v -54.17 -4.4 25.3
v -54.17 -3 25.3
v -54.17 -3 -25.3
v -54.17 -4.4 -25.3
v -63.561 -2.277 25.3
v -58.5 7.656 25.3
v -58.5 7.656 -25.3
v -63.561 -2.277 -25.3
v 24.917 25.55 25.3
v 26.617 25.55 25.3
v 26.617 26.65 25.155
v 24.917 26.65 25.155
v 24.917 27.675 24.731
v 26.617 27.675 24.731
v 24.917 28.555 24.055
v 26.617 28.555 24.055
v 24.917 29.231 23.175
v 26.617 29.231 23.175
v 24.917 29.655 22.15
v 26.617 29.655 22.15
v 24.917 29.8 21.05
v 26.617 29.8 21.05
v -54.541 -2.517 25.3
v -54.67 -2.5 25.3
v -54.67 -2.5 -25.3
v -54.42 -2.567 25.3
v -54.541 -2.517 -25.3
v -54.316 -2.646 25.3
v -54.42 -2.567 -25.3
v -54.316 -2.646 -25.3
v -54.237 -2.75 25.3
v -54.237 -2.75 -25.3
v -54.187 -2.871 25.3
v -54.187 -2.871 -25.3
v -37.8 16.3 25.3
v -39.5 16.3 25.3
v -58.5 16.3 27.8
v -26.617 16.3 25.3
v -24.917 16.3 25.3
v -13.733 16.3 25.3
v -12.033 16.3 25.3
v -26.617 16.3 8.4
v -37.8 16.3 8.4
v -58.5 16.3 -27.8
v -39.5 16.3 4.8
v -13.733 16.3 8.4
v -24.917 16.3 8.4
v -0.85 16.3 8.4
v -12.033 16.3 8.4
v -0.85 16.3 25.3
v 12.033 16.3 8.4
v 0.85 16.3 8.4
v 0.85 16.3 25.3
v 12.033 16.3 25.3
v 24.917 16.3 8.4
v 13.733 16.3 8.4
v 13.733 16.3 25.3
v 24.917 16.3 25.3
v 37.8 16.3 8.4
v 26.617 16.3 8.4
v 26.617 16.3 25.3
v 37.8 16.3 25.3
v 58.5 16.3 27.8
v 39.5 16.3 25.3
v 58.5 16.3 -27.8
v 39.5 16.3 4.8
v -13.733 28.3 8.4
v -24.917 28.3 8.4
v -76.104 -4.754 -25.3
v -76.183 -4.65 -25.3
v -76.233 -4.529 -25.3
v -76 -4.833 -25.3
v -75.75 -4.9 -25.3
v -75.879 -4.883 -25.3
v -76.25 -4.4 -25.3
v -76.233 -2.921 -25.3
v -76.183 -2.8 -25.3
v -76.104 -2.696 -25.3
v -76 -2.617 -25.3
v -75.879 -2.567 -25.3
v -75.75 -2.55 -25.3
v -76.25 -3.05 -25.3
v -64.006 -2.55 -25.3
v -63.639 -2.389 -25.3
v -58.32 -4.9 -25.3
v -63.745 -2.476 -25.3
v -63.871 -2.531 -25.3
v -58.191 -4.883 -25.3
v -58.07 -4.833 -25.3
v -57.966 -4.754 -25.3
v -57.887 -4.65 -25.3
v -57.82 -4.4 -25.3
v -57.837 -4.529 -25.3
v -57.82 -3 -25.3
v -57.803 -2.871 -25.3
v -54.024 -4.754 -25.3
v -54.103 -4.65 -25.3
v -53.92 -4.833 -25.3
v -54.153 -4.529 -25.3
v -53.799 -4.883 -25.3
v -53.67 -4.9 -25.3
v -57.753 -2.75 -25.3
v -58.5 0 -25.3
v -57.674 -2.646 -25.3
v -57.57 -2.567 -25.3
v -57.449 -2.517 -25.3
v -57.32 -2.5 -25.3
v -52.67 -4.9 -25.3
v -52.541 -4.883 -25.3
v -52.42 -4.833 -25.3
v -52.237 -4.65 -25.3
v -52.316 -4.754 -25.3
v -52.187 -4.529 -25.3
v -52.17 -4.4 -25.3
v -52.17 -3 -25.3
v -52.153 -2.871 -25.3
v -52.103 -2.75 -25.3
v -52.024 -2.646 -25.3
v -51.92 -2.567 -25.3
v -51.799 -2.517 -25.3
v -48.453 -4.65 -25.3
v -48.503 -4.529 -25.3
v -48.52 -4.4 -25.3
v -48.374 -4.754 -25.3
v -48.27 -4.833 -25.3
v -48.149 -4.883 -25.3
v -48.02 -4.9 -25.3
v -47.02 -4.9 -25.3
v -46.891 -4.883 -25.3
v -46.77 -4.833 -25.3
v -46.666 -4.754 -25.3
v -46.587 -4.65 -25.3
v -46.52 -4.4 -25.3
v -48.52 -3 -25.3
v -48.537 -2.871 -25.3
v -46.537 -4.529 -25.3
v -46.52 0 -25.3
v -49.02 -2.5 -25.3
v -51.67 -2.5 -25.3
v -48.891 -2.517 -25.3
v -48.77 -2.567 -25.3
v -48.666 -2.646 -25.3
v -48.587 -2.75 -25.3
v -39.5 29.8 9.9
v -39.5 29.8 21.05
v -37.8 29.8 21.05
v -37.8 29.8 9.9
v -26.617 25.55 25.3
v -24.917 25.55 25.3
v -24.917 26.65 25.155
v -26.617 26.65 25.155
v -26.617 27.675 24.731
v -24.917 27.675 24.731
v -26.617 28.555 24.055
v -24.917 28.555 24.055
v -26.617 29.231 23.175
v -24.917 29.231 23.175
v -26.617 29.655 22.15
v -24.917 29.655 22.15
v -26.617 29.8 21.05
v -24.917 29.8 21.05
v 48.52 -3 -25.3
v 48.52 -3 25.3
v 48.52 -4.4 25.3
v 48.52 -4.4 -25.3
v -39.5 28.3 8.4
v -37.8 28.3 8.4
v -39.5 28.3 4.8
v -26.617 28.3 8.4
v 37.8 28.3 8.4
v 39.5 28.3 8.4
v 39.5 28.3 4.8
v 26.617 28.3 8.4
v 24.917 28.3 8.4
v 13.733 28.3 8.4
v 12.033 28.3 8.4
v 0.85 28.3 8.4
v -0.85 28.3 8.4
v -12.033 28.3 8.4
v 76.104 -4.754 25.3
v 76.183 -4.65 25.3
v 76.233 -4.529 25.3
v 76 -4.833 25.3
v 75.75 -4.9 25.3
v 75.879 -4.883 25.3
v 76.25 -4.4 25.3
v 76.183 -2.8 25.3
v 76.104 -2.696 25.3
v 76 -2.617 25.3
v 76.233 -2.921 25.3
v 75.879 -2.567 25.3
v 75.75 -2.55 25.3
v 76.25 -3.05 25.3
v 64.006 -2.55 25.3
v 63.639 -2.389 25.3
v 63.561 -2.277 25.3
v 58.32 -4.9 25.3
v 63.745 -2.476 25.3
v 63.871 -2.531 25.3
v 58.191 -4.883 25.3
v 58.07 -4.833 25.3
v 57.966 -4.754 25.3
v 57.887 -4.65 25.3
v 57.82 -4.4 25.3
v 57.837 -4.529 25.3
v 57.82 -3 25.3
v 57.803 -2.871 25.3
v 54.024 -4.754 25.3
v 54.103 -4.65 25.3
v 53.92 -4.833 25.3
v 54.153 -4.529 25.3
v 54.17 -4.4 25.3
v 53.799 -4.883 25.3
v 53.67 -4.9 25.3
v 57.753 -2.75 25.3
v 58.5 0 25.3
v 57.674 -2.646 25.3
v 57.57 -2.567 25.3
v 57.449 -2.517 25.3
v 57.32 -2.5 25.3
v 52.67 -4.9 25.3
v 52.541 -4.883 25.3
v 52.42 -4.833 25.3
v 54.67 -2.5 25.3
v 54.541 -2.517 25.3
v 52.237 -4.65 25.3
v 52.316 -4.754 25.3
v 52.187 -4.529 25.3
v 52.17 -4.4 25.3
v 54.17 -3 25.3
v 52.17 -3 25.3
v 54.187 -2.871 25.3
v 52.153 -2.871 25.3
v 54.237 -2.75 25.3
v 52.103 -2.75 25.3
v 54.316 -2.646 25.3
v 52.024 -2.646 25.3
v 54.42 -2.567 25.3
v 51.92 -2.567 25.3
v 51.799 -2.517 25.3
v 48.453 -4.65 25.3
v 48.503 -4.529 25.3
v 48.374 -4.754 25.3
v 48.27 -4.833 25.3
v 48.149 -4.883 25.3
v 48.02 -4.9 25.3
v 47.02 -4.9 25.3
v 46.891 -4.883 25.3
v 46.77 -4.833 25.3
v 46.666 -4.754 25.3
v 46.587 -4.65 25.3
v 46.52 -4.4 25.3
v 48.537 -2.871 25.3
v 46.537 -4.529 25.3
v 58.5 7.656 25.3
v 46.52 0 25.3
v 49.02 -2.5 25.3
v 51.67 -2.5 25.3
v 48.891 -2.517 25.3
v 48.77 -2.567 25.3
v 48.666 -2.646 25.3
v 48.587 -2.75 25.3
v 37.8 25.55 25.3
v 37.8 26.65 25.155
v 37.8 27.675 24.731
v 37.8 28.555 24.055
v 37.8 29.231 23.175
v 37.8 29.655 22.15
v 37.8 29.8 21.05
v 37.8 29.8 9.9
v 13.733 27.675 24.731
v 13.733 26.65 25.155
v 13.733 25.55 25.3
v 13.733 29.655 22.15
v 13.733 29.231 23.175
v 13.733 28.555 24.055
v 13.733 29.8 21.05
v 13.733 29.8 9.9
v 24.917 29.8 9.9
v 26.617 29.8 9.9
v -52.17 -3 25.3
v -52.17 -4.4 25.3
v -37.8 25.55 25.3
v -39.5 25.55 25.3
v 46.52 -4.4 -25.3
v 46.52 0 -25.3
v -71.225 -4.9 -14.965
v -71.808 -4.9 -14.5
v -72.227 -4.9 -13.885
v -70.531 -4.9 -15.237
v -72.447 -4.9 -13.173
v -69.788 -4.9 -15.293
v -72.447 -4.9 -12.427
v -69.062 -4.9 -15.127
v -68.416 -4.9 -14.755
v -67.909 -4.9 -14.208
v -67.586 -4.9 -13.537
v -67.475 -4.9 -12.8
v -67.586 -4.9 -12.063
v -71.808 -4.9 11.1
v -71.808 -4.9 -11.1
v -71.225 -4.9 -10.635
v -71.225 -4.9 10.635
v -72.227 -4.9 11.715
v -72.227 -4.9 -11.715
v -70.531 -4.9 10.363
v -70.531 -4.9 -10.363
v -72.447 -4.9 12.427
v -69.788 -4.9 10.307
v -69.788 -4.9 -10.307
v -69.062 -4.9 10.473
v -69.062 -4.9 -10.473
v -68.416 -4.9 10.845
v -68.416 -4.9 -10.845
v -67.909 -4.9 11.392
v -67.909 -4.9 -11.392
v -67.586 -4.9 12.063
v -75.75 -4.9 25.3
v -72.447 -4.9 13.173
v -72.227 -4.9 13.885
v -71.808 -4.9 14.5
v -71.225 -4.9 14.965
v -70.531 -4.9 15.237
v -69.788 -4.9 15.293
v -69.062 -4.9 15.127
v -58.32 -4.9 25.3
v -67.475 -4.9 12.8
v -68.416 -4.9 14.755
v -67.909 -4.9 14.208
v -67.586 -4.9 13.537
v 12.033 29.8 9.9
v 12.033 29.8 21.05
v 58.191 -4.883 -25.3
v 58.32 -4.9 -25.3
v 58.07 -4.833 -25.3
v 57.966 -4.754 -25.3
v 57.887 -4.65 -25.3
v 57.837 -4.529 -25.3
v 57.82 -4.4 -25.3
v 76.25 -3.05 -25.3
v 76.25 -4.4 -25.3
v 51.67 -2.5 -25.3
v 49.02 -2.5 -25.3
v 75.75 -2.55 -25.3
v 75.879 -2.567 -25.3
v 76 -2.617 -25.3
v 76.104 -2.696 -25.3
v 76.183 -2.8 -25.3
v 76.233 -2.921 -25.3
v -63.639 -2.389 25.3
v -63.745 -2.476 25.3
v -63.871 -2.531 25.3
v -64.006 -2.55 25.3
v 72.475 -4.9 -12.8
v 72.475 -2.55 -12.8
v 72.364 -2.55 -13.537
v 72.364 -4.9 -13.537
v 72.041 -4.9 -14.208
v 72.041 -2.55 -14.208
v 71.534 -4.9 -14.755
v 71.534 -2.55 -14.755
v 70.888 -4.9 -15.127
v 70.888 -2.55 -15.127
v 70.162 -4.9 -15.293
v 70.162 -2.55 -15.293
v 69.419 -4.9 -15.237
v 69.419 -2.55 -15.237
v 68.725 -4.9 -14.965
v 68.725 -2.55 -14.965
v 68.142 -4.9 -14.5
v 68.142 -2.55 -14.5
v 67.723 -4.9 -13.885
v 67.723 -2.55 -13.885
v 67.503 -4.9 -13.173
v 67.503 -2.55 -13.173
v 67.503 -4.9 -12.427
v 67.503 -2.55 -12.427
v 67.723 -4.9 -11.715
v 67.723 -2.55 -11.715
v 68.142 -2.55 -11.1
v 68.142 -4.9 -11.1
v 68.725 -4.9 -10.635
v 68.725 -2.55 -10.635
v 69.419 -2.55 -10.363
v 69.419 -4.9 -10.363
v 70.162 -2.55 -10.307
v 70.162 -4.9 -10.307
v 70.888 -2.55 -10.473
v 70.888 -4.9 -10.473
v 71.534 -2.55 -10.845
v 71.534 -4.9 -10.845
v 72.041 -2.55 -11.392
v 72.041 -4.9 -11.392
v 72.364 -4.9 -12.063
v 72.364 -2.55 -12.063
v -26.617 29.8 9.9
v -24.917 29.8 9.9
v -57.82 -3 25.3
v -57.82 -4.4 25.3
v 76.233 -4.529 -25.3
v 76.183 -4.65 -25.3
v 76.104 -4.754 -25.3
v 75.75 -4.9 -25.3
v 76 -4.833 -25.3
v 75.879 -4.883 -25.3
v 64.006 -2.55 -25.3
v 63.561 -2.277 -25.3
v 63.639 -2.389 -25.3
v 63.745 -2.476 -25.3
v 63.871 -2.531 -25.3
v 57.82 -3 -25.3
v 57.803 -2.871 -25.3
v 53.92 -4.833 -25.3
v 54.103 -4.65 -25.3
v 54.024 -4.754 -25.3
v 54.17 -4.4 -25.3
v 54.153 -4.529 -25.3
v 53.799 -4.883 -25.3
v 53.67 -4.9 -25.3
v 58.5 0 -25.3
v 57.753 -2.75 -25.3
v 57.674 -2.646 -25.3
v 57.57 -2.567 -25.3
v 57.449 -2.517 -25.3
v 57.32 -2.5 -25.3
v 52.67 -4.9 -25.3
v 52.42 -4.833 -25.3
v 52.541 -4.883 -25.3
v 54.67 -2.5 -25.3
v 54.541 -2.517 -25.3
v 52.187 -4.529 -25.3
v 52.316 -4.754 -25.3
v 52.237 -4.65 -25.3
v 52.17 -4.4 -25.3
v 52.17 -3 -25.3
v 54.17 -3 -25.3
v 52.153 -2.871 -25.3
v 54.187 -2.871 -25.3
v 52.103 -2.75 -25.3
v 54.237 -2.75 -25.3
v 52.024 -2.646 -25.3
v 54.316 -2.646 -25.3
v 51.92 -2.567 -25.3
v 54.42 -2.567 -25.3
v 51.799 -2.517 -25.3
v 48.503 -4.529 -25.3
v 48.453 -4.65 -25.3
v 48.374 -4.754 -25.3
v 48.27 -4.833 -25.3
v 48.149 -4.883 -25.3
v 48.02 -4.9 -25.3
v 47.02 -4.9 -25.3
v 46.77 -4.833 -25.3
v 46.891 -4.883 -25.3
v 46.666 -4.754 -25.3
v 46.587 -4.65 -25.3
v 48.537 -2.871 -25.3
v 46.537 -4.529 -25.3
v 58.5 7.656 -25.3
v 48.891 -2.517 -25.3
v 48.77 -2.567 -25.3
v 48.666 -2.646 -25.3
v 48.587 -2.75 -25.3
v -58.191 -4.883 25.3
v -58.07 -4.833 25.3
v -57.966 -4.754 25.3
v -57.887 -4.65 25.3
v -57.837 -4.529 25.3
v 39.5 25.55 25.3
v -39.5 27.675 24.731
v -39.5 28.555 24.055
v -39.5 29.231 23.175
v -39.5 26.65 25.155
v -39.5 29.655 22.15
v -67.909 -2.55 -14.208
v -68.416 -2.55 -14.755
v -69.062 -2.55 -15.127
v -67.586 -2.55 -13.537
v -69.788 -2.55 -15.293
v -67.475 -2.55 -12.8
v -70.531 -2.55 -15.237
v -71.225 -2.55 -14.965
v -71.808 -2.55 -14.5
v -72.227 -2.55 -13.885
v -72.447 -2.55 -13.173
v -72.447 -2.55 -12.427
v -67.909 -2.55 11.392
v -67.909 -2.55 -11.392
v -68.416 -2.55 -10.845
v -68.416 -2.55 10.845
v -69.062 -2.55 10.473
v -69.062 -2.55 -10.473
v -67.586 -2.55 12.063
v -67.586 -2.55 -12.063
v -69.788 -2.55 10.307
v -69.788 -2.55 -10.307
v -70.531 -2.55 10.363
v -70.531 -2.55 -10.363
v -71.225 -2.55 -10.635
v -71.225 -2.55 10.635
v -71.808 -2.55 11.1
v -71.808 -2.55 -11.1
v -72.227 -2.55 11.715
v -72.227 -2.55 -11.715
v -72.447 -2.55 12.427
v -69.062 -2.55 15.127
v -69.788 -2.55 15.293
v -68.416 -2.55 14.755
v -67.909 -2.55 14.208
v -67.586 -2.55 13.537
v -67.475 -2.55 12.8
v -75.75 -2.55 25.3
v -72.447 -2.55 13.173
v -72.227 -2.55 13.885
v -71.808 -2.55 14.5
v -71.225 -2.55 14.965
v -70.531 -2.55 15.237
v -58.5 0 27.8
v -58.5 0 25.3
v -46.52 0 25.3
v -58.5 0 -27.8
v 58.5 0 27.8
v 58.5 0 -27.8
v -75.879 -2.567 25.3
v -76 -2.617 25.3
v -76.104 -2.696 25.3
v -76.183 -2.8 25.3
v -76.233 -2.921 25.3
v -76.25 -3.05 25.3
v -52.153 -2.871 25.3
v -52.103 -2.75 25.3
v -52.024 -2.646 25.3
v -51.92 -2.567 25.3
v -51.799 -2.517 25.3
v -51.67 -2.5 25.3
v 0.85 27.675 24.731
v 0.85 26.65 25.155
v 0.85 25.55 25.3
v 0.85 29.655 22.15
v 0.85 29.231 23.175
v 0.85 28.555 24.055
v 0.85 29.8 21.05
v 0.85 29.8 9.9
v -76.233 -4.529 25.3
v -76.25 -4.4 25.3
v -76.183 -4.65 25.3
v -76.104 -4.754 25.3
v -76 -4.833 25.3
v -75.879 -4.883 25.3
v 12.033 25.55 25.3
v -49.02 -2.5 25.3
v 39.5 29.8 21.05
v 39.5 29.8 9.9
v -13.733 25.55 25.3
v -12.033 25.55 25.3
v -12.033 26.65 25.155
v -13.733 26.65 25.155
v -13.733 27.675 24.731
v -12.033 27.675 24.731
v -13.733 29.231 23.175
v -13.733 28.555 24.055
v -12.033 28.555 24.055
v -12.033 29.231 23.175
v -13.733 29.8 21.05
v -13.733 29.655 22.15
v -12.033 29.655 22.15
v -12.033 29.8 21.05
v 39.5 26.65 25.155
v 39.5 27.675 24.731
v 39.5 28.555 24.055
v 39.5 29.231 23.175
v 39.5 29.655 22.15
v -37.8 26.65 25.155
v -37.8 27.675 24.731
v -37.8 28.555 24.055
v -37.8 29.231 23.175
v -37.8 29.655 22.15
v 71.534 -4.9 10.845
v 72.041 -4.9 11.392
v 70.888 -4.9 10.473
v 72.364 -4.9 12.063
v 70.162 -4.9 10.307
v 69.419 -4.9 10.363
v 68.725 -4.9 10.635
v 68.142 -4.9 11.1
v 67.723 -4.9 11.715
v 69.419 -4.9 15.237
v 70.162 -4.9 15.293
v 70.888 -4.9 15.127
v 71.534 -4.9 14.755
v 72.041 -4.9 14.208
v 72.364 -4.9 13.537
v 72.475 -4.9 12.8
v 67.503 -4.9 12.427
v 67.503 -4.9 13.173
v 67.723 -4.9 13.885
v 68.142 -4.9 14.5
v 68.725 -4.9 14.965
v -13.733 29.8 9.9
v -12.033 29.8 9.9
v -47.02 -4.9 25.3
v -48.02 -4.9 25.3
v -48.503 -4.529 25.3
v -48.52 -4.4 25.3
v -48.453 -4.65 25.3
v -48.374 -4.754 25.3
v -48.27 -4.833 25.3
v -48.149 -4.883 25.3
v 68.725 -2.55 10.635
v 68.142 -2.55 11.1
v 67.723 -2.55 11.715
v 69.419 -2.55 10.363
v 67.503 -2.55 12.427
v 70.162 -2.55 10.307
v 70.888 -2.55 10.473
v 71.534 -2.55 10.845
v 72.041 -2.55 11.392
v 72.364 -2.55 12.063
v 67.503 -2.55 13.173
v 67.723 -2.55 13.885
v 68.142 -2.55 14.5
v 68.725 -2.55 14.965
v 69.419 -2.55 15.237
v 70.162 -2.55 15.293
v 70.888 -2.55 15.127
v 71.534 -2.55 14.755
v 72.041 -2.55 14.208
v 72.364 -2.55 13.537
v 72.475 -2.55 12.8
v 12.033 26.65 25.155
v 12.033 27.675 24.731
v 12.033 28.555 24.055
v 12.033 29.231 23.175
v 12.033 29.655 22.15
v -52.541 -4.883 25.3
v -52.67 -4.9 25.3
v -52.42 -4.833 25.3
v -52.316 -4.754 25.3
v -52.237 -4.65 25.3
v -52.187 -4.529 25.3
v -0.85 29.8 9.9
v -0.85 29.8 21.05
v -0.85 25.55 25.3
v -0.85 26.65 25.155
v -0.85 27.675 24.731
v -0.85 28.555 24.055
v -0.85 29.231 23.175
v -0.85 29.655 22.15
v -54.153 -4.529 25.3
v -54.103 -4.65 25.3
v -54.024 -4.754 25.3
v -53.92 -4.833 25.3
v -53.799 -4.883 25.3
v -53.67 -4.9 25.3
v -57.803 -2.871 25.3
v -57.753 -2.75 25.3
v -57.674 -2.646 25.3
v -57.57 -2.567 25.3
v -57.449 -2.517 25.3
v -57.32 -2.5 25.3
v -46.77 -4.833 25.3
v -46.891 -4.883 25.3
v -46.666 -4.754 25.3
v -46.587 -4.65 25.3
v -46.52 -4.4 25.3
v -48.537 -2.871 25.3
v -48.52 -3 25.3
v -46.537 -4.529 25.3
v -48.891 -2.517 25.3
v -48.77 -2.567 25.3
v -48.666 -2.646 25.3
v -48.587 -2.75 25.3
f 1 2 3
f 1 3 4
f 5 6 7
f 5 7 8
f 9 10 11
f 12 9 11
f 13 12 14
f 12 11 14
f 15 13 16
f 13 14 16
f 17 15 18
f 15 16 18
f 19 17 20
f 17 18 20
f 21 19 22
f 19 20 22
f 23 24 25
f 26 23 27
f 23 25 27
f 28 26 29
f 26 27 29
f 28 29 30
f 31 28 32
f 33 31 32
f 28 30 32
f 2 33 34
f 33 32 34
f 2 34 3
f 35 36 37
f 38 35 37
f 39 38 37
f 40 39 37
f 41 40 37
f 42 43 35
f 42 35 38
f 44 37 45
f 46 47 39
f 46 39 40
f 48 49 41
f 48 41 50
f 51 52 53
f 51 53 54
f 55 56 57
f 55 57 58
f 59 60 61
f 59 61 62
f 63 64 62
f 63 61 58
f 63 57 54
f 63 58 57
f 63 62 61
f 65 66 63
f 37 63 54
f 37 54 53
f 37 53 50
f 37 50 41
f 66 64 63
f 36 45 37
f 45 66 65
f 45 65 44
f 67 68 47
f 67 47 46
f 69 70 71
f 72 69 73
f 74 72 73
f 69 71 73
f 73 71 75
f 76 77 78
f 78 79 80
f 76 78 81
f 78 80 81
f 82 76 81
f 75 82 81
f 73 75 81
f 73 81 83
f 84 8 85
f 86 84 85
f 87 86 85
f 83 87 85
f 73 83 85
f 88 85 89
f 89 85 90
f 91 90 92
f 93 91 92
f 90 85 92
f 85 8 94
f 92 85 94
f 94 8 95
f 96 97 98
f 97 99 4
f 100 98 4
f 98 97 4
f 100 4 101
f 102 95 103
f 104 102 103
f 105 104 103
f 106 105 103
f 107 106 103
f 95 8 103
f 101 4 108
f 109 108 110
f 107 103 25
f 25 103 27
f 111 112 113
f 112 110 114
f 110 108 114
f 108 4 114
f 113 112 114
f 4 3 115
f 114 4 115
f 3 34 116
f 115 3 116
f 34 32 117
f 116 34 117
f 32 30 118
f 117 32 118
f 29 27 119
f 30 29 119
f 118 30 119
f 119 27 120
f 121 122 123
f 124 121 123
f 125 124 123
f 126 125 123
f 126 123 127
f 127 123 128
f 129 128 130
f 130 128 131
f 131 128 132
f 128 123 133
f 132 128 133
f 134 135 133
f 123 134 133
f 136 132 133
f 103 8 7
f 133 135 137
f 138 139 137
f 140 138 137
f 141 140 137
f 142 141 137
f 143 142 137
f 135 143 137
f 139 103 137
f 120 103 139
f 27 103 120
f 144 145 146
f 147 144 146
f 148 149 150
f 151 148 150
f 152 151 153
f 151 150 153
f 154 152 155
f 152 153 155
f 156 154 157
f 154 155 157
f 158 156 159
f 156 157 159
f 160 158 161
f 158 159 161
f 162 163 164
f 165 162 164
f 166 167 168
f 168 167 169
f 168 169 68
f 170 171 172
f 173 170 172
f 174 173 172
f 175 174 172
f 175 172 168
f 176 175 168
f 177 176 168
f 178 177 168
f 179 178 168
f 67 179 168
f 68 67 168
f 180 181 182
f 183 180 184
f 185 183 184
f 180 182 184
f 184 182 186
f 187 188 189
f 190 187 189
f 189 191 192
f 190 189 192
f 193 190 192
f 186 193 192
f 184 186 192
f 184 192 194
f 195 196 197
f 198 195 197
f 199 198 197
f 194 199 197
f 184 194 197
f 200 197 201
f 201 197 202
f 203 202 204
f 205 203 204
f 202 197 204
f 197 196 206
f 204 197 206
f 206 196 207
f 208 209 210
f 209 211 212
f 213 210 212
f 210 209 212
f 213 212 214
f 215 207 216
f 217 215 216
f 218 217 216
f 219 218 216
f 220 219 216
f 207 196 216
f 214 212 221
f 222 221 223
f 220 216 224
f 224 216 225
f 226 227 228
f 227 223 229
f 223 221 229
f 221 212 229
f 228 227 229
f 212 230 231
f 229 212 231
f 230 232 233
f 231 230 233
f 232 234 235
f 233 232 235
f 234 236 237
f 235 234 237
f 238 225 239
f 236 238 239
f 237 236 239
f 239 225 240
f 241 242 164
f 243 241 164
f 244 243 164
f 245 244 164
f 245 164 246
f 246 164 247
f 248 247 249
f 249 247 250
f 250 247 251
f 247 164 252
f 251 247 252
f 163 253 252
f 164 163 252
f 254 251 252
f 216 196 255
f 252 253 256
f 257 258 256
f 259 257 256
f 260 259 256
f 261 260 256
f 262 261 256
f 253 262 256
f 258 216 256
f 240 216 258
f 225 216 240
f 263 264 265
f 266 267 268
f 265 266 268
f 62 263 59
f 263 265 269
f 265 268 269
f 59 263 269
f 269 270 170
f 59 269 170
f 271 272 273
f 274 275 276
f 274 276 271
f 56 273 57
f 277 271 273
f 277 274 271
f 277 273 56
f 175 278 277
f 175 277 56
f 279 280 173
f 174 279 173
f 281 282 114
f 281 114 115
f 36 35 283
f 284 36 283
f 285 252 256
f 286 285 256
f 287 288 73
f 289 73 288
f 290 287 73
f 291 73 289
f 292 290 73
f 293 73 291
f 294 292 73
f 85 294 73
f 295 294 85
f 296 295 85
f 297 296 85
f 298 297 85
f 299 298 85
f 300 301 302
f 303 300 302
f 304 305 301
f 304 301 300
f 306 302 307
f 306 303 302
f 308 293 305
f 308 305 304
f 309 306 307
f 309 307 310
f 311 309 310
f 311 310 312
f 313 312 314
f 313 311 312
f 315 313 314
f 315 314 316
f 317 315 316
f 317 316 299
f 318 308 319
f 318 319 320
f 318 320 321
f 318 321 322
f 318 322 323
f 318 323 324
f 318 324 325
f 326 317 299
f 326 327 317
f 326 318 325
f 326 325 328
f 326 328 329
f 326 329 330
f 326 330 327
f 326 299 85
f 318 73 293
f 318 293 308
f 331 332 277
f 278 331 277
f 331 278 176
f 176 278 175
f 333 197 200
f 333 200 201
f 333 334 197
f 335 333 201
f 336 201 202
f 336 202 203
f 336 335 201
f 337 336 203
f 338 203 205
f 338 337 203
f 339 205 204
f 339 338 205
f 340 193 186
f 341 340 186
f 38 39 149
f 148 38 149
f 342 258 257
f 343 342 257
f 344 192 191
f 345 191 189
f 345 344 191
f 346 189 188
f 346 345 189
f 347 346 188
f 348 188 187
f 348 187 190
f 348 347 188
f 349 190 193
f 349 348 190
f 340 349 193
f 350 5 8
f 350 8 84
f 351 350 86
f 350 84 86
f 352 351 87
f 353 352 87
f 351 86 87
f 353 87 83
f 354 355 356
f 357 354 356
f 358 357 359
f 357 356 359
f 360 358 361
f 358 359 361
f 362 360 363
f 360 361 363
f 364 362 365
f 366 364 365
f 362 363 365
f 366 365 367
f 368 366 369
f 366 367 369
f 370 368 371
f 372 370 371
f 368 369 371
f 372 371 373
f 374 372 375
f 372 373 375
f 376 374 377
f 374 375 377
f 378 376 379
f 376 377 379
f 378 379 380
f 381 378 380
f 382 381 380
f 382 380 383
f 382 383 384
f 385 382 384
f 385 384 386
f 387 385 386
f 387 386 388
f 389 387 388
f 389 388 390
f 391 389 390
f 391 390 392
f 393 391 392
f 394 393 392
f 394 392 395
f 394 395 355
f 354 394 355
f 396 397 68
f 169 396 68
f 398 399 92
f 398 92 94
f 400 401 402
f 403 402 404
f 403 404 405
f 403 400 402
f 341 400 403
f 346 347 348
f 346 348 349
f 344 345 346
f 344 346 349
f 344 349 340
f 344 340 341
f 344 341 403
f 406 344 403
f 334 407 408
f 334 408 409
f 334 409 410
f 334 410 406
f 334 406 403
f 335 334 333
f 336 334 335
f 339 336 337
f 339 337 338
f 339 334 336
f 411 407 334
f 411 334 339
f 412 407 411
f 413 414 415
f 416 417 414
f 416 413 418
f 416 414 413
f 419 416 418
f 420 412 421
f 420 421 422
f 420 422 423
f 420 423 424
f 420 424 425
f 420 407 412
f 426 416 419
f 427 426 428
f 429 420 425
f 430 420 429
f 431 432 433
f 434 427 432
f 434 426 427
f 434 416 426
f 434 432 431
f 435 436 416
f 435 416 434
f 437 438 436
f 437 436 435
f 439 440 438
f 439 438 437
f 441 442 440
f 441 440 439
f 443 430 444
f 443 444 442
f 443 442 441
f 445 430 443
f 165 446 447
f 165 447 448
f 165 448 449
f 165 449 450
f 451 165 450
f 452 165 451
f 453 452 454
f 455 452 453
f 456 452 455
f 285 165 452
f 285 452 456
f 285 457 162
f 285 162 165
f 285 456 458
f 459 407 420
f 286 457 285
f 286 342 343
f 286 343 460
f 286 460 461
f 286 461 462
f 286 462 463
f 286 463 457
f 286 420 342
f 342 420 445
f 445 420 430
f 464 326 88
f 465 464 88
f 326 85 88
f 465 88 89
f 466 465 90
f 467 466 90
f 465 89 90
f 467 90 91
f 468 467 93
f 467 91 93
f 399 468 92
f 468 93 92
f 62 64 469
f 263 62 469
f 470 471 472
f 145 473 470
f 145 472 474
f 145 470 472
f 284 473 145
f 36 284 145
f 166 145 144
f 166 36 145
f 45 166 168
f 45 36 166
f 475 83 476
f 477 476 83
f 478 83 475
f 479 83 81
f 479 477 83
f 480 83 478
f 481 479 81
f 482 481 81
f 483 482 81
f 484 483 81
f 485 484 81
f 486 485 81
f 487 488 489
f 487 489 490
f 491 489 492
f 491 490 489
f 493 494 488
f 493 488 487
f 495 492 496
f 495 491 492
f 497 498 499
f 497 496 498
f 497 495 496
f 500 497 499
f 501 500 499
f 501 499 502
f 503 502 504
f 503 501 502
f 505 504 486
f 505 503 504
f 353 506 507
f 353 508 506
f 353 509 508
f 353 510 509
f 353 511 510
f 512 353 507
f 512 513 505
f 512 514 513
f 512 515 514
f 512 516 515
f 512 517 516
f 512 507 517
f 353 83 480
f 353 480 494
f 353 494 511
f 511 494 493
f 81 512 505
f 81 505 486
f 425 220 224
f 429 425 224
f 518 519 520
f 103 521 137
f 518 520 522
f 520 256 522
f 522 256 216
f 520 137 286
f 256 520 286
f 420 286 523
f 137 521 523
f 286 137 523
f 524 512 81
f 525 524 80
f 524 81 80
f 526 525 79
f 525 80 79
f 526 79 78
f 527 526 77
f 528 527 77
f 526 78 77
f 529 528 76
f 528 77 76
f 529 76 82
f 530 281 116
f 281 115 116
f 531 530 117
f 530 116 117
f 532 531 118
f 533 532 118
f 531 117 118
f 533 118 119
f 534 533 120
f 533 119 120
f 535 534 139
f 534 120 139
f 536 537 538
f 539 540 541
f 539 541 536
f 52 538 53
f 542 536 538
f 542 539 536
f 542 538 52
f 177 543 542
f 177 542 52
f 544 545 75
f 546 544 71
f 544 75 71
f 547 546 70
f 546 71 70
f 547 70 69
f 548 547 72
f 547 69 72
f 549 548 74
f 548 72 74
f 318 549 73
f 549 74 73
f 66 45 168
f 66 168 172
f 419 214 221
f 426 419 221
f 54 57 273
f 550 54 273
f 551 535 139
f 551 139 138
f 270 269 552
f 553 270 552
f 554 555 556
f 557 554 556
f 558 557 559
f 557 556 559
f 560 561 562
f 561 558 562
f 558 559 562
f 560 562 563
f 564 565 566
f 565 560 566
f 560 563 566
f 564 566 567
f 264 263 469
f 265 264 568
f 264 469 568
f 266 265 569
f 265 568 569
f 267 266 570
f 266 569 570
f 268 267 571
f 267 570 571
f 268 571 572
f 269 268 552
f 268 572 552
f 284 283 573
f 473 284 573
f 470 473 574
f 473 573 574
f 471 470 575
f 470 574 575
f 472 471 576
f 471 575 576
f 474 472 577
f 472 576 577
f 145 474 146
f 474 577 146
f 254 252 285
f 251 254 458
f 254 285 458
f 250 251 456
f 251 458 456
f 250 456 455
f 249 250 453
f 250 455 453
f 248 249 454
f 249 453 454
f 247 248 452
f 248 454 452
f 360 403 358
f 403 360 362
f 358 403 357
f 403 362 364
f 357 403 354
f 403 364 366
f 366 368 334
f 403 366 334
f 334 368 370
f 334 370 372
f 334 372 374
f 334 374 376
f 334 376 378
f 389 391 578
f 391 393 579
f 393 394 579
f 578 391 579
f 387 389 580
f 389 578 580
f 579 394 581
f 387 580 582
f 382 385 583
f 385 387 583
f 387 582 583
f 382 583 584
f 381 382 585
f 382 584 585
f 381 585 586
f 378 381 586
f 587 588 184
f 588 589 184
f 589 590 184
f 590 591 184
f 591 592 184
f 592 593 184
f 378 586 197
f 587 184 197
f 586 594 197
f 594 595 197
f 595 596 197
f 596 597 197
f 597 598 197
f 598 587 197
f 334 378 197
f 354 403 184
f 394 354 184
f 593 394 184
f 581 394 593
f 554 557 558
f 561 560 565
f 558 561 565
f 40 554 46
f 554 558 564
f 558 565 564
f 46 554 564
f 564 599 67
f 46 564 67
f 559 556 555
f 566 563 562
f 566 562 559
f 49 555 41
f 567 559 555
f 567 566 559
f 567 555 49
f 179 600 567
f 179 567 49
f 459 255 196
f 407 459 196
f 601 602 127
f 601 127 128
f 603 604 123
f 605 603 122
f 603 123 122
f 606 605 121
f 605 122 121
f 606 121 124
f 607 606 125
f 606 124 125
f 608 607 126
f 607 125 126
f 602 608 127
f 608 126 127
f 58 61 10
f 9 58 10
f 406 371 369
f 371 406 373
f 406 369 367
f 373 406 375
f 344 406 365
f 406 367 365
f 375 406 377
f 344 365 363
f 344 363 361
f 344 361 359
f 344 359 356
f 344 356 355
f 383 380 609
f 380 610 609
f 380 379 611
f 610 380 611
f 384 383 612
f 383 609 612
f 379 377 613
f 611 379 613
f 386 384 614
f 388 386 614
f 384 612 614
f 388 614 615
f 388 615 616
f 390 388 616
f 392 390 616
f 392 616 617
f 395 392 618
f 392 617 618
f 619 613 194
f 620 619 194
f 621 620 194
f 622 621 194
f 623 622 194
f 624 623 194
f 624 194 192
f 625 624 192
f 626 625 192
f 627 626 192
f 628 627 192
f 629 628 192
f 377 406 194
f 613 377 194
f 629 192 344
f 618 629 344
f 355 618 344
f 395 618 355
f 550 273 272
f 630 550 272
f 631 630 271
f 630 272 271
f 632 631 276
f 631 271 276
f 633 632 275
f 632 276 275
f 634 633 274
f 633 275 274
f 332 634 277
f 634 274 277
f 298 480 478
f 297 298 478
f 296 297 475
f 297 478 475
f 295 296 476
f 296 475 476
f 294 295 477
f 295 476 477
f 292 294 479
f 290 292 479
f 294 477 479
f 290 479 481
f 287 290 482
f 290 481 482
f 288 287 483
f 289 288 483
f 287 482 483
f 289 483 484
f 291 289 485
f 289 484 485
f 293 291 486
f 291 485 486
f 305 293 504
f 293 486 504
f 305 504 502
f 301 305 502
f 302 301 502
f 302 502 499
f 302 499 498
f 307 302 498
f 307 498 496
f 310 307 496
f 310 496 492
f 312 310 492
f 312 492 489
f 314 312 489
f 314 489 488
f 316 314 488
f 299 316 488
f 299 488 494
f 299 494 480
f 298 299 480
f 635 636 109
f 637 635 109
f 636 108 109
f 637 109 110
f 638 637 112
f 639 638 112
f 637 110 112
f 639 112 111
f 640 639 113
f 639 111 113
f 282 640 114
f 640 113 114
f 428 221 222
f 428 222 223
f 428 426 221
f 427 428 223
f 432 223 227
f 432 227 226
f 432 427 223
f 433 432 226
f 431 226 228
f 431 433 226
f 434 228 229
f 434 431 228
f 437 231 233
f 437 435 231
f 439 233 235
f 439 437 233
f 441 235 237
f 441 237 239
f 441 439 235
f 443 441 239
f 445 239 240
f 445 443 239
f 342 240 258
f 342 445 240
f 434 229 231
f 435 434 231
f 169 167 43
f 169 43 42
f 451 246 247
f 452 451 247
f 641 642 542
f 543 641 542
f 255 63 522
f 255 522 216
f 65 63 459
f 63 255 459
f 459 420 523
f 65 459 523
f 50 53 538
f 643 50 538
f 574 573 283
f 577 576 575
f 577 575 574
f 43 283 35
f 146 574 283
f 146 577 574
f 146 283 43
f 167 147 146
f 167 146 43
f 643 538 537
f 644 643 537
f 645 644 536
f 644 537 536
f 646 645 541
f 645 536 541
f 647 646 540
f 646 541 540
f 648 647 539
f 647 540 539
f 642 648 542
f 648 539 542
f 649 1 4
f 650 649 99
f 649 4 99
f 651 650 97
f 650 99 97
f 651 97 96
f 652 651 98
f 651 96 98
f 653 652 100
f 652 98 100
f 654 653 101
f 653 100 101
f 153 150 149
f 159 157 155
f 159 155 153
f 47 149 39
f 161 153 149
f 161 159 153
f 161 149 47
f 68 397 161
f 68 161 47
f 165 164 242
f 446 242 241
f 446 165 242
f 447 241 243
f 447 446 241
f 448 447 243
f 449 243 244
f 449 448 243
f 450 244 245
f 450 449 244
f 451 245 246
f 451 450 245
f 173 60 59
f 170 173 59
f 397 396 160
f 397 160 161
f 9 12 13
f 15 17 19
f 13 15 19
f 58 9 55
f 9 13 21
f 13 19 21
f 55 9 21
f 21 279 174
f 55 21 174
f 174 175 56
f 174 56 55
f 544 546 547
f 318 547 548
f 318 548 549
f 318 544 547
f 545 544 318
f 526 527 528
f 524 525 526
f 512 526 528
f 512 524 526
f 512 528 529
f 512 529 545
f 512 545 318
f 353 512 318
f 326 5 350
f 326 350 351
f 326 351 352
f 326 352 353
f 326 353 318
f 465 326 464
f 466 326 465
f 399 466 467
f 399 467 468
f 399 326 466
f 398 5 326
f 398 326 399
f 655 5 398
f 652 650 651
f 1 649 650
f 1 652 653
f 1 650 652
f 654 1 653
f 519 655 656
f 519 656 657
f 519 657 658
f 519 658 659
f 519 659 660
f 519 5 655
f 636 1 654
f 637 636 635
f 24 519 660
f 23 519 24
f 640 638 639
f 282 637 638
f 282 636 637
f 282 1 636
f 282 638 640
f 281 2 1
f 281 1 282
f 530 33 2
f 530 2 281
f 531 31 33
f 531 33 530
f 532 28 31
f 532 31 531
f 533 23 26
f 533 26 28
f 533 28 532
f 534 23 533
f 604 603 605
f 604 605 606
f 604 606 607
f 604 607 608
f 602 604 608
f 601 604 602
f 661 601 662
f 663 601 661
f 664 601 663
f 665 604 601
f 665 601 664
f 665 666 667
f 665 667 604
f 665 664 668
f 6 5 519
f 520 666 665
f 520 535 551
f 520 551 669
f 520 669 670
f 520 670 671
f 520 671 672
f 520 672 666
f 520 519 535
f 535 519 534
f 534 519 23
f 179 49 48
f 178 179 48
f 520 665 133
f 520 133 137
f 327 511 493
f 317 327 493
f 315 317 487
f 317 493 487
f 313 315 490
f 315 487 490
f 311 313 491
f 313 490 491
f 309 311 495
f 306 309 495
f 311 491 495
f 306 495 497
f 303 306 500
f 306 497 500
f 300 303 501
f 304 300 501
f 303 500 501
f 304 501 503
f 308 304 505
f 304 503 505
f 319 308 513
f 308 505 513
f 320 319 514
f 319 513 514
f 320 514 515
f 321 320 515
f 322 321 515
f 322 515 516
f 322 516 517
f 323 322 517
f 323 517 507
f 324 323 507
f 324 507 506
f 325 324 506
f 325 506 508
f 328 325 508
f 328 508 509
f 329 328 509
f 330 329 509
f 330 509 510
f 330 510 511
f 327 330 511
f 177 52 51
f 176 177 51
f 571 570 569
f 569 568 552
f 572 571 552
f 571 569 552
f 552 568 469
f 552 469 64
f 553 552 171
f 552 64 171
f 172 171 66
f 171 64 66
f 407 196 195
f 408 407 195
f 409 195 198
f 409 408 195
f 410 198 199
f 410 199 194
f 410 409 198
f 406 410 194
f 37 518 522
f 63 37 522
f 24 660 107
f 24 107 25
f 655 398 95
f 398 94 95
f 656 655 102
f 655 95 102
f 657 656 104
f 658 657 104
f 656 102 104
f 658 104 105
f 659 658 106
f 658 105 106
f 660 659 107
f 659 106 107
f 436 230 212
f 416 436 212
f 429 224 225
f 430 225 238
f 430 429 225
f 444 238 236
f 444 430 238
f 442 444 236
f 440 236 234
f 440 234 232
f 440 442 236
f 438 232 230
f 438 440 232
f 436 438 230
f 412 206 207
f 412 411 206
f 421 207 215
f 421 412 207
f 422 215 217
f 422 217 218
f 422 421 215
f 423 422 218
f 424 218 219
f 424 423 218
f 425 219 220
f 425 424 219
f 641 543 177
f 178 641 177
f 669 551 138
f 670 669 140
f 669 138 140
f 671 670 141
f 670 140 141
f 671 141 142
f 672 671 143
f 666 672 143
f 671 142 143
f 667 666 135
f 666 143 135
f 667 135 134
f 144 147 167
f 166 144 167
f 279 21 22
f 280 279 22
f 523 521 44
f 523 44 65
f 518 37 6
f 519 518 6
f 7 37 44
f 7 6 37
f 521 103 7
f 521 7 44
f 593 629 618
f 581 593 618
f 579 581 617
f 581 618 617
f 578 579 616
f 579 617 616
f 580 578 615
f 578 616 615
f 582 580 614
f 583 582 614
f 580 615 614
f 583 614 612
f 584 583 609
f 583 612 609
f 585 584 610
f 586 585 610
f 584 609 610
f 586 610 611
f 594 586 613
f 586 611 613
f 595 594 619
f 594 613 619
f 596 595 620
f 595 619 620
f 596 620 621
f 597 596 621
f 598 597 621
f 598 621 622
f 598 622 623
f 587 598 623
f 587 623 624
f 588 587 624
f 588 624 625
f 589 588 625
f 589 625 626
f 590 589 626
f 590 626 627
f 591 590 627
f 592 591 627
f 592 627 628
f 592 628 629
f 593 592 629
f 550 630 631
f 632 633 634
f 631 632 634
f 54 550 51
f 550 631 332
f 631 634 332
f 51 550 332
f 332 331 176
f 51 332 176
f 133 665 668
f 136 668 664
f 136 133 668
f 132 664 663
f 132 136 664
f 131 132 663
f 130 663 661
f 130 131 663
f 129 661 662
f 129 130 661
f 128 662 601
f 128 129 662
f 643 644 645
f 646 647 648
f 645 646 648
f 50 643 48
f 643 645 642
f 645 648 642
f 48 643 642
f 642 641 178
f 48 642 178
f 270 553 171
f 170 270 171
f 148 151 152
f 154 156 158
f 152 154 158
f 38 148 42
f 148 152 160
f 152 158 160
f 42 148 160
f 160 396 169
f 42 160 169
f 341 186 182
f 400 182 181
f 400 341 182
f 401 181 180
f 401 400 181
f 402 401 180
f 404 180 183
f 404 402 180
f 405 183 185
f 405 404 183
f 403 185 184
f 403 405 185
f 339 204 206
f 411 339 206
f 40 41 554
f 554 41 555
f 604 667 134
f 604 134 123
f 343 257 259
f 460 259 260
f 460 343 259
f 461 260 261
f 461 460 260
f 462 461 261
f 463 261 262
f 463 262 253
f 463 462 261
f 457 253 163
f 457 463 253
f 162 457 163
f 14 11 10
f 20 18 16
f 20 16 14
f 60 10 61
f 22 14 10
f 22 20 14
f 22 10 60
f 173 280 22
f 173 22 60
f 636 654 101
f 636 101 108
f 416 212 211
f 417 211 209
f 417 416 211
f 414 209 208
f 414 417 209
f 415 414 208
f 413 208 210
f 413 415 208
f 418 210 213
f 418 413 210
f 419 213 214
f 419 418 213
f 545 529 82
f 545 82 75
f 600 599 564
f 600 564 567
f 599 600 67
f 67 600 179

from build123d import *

# Parameters (mm, degrees)
SKETCH1_W           = 117
SKETCH1_H           = 55.6
BOSS_EXTRUDE1_DEPTH = 16.3
SKETCH2_W           = 79
SKETCH2_H           = 23
BOSS_EXTRUDE2_DEPTH = 13.5
SKETCH4_W           = 11.183333333
SKETCH4_H           = 19.4
SKETCH4_W_2         = 11.183333334
CUT_EXTRUDE2_DEPTH  = 13.5
CUT_EXTRUDE1_DEPTH  = 79
BOSS_EXTRUDE3_DEPTH = 50.6
SKETCH7_R           = 2.5
CUT_EXTRUDE3_DEPTH  = 3.35
FILLET1_R           = 0.5


with BuildPart() as part:
    # Sketch1 → Boss-Extrude1 (new body)
    with BuildSketch(Plane(origin=(0, 0, 0), x_dir=(1, 0, 0), z_dir=(0, 1, 0))):
        Rectangle(SKETCH1_W, SKETCH1_H)
    extrude(amount=BOSS_EXTRUDE1_DEPTH)

    # Sketch2 → Boss-Extrude2 (add)
    with BuildSketch(Plane(origin=(0, 16.3, 0), x_dir=(1, 0, 0), z_dir=(0, 1, 0))):
        with Locations((0, -16.3)):
            Rectangle(SKETCH2_W, SKETCH2_H)
    extrude(amount=BOSS_EXTRUDE2_DEPTH)

    # Sketch4 → Cut-Extrude2 (cut)
    with BuildSketch(Plane(origin=(0, 29.8, 0), x_dir=(1, 0, 0), z_dir=(0, 1, 0))):
        with Locations((-32.208333334, -18.1)):
            Rectangle(SKETCH4_W, SKETCH4_H)
        with Locations((-19.325, -18.1)):
            Rectangle(SKETCH4_W_2, SKETCH4_H)
        with Locations((-6.441666667, -18.1)):
            Rectangle(SKETCH4_W, SKETCH4_H)
        with Locations((6.441666667, -18.1)):
            Rectangle(SKETCH4_W, SKETCH4_H)
        with Locations((19.325, -18.1)):
            Rectangle(SKETCH4_W_2, SKETCH4_H)
        with Locations((32.208333334, -18.1)):
            Rectangle(SKETCH4_W, SKETCH4_H)
    extrude(amount=-CUT_EXTRUDE2_DEPTH, mode=Mode.SUBTRACT)

    # Sketch3 → Cut-Extrude1 (cut)
    with BuildSketch(Plane(origin=(39.5, 0, 0), x_dir=(0, 0, -1), z_dir=(1, 0, 0))):
        with BuildLine():
            Line((-27.8, 16.3), (-25.3, 16.3))
            Line((-25.3, 16.3), (-25.3, 25.55))
            ThreePointArc((-25.3, 25.55), (-24.05520382, 28.55520382), (-21.05, 29.8))
            Line((-21.05, 29.8), (-27.8, 29.8))
            Line((-27.8, 29.8), (-27.8, 16.3))
        make_face()
        Polygon((-9.9, 29.8), (-8.4, 28.3), (-4.8, 28.3), (-4.8, 29.8), align=None)
    extrude(amount=-CUT_EXTRUDE1_DEPTH, mode=Mode.SUBTRACT)

    # Sketch5 → Boss-Extrude3 (add)
    with BuildSketch(Plane.XY.offset(25.3)):
        Polygon((-58.5, 7.655574629), (-63.7, -2.55), (-76.25, -2.55), (-76.25, -4.9), (-57.82, -4.9), (-57.82, -2.5), (-54.17, -2.5), (-54.17, -4.9), (-52.17, -4.9), (-52.17, -2.5), (-48.52, -2.5), (-48.52, -4.9), (-46.52, -4.9), (-46.52, 0), (-58.5, 0), align=None)
        Polygon((58.5, 0), (58.5, 7.655574629), (63.7, -2.55), (76.25, -2.55), (76.25, -4.9), (57.82, -4.9), (57.82, -2.5), (54.17, -2.5), (54.17, -4.9), (52.17, -4.9), (52.17, -2.5), (48.52, -2.5), (48.52, -4.9), (46.52, -4.9), (46.52, 0), align=None)
    extrude(amount=-BOSS_EXTRUDE3_DEPTH)

    # Sketch7 → Cut-Extrude3 (cut, through all)
    with BuildSketch(Plane(origin=(0, -2.55, 0), x_dir=(1, 0, 0), z_dir=(0, 1, 0))):
        with Locations((-69.975, 12.8)):
            Circle(SKETCH7_R)
        with Locations((69.975, 12.8)):
            Circle(SKETCH7_R)
        with Locations((69.975, -12.8)):
            Circle(SKETCH7_R)
        with Locations((-69.975, -12.8)):
            Circle(SKETCH7_R)
    extrude(amount=-CUT_EXTRUDE3_DEPTH, mode=Mode.SUBTRACT)

    # Fillet1
    fillet1_edges = [part.edges().sort_by_distance(p)[0] for p in [
        (-46.52, -4.9, 0),
        (-48.52, -4.9, 0),
        (-48.52, -2.5, 0),
        (-52.17, -2.5, 0),
        (-52.17, -4.9, 0),
        (-54.17, -4.9, 0),
        (-54.17, -2.5, 0),
        (-57.82, -2.5, 0),
        (-57.82, -4.9, 0),
        (-76.25, -4.9, 0),
        (-76.25, -2.55, 0),
        (-63.7, -2.55, 0),
        (63.7, -2.55, 0),
        (76.25, -2.55, 0),
        (76.25, -4.9, 0),
        (57.82, -4.9, 0),
        (57.82, -2.5, 0),
        (54.17, -2.5, 0),
        (54.17, -4.9, 0),
        (52.17, -4.9, 0),
        (52.17, -2.5, 0),
        (48.52, -2.5, 0),
        (48.52, -4.9, 0),
        (46.52, -4.9, 0),
    ]]
    fillet(fillet1_edges, radius=FILLET1_R)


solid = part.part
